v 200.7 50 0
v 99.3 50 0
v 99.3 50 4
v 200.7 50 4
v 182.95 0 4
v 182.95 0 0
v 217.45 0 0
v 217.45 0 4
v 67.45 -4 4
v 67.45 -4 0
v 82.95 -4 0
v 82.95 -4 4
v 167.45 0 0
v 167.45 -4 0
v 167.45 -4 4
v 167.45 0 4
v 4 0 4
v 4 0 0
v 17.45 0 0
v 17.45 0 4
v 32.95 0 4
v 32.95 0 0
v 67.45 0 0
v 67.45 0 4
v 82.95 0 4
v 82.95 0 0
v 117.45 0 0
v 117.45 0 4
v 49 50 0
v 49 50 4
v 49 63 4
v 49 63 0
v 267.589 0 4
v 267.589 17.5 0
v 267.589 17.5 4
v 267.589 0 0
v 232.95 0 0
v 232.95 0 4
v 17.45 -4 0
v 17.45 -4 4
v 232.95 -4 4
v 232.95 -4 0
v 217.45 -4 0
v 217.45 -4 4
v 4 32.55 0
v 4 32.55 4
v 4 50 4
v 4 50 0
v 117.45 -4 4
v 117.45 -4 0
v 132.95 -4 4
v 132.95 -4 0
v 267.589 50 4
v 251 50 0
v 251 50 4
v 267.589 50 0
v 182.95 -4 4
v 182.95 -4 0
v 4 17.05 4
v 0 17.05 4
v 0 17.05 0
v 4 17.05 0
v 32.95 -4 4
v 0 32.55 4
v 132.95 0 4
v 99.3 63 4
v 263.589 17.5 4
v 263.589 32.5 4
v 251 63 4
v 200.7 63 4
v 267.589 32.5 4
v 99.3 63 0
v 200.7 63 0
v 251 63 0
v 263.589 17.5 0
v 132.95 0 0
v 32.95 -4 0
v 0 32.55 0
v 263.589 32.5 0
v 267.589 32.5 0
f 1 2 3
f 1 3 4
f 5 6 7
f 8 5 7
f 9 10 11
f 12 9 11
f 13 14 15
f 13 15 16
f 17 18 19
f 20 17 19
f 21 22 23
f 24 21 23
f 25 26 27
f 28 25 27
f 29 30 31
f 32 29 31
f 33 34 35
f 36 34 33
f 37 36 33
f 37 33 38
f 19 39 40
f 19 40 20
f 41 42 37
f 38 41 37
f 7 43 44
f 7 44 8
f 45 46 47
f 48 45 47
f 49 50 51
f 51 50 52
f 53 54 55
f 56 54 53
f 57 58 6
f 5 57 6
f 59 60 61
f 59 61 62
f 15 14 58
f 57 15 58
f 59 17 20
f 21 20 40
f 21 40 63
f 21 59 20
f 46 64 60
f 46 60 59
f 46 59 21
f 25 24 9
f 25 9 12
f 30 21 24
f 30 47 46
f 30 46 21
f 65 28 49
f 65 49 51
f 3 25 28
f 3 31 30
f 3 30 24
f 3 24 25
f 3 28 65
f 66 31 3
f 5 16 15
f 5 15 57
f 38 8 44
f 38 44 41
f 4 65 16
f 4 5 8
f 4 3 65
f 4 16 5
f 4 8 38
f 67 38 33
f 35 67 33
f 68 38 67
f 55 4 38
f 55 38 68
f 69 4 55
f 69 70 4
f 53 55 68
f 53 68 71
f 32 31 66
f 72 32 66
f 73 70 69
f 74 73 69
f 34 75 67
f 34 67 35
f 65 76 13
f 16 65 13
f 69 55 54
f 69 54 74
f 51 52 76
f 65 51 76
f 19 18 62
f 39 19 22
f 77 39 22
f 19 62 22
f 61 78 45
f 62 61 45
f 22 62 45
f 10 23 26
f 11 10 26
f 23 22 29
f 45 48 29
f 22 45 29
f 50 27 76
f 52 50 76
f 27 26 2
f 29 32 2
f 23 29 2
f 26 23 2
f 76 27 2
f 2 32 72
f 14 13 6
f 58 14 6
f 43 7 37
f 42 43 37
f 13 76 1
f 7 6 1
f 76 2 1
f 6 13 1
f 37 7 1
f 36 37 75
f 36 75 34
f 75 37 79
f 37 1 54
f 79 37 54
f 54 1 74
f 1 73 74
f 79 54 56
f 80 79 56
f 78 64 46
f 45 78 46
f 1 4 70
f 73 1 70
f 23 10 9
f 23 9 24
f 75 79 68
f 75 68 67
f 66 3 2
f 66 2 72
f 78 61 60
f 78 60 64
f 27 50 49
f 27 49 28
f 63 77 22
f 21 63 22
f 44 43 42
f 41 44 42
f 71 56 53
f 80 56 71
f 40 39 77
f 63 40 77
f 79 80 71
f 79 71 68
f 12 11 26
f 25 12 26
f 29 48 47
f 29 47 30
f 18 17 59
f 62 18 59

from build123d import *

# Parameters (mm, degrees)
SKIZZE1_W                       = 300
SKIZZE1_H                       = 50
AUFSATZ_LINEAR_AUSTRAGEN1_DEPTH = 4
SKIZZE2_W                       = 15.5
SKIZZE2_H                       = 4
AUFSATZ_LINEAR_AUSTRAGEN3_DEPTH = 4
SCHNITT_LINEAR_AUSTRAGEN1_REACH = 6
SKIZZE3_W                       = 4
SKIZZE3_H                       = 17.45
SKIZZE3_H_2                     = 17.05
SKIZZE4_W                       = 50.3
SKIZZE4_H                       = 13
AUFSATZ_LINEAR_AUSTRAGEN4_DEPTH = 4
SCHNITT_LINEAR_AUSTRAGEN2_REACH = 6


with BuildPart() as part:
    # Skizze1 → Aufsatz-Linear austragen1 (new body)
    with BuildSketch(Plane.XY):
        with Locations((150, 25)):
            Rectangle(SKIZZE1_W, SKIZZE1_H)
    extrude(amount=AUFSATZ_LINEAR_AUSTRAGEN1_DEPTH)

    # Skizze2 → Aufsatz-Linear austragen3 (add)
    with BuildSketch(Plane.XY):
        with Locations((25.2, -2)):
            Rectangle(SKIZZE2_W, SKIZZE2_H)
        with Locations((75.2, -2)):
            Rectangle(SKIZZE2_W, SKIZZE2_H)
        with Locations((125.2, -2)):
            Rectangle(SKIZZE2_W, SKIZZE2_H)
        with Locations((175.2, -2)):
            Rectangle(SKIZZE2_W, SKIZZE2_H)
        with Locations((225.2, -2)):
            Rectangle(SKIZZE2_W, SKIZZE2_H)
        with Locations((275.2, -2)):
            Rectangle(SKIZZE2_W, SKIZZE2_H)
    extrude(amount=AUFSATZ_LINEAR_AUSTRAGEN3_DEPTH)

    # Skizze3 → Schnitt-Linear austragen1 (cut, up to next)
    with BuildSketch(Plane.XY.offset(4), mode=Mode.PRIVATE) as schnitt_linear_austragen1_sk1:
        with Locations((2, 41.275)):
            Rectangle(SKIZZE3_W, SKIZZE3_H)
    schnitt_linear_austragen1_tool1 = extrude(schnitt_linear_austragen1_sk1.sketch, amount=-SCHNITT_LINEAR_AUSTRAGEN1_REACH, mode=Mode.PRIVATE) & part.part
    add(schnitt_linear_austragen1_tool1.solids().sort_by_distance((2, 41.275, 4))[0], mode=Mode.SUBTRACT)
    # Skizze3 → Schnitt-Linear austragen1 (cut, up to next)
    with BuildSketch(Plane.XY.offset(4), mode=Mode.PRIVATE) as schnitt_linear_austragen1_sk2:
        with Locations((2, 8.525)):
            Rectangle(SKIZZE3_W, SKIZZE3_H_2)
    schnitt_linear_austragen1_tool2 = extrude(schnitt_linear_austragen1_sk2.sketch, amount=-SCHNITT_LINEAR_AUSTRAGEN1_REACH, mode=Mode.PRIVATE) & part.part
    add(schnitt_linear_austragen1_tool2.solids().sort_by_distance((2, 8.525, 4))[0], mode=Mode.SUBTRACT)
    # Skizze3 → Schnitt-Linear austragen1 (cut, up to next)
    with BuildSketch(Plane.XY.offset(4), mode=Mode.PRIVATE) as schnitt_linear_austragen1_sk3:
        with Locations((298, 8.525)):
            Rectangle(SKIZZE3_W, SKIZZE3_H_2)
    schnitt_linear_austragen1_tool3 = extrude(schnitt_linear_austragen1_sk3.sketch, amount=-SCHNITT_LINEAR_AUSTRAGEN1_REACH, mode=Mode.PRIVATE) & part.part
    add(schnitt_linear_austragen1_tool3.solids().sort_by_distance((298, 8.525, 4))[0], mode=Mode.SUBTRACT)
    # Skizze3 → Schnitt-Linear austragen1 (cut, up to next)
    with BuildSketch(Plane.XY.offset(4), mode=Mode.PRIVATE) as schnitt_linear_austragen1_sk4:
        with Locations((298, 41.275)):
            Rectangle(SKIZZE3_W, SKIZZE3_H)
    schnitt_linear_austragen1_tool4 = extrude(schnitt_linear_austragen1_sk4.sketch, amount=-SCHNITT_LINEAR_AUSTRAGEN1_REACH, mode=Mode.PRIVATE) & part.part
    add(schnitt_linear_austragen1_tool4.solids().sort_by_distance((298, 41.275, 4))[0], mode=Mode.SUBTRACT)

    # Skizze4 → Aufsatz-Linear austragen4 (add)
    with BuildSketch(Plane.XY.offset(4)):
        with Locations((74.15, 56.5)):
            Rectangle(SKIZZE4_W, SKIZZE4_H)
        with Locations((225.85, 56.5)):
            Rectangle(SKIZZE4_W, SKIZZE4_H)
    extrude(amount=-AUFSATZ_LINEAR_AUSTRAGEN4_DEPTH)

    # Skizze5 → Schnitt-Linear austragen2 (cut, up to next)
    with BuildSketch(Plane(origin=(0, 0, 0), x_dir=(-1, 0, 0), z_dir=(0, 0, -1)), mode=Mode.PRIVATE) as schnitt_linear_austragen2_sk1:
        Polygon((-267.589208013, 50), (-267.589208013, 32.5), (-263.589208013, 32.5), (-263.589208013, 17.5), (-267.589208013, 17.5), (-267.589208013, 0), (-260.181086132, 0), (-260.181086132, -8.903305995), (-305.118419692, -8.903305995), (-305.118419692, 50), align=None)
    schnitt_linear_austragen2_tool1 = extrude(schnitt_linear_austragen2_sk1.sketch, amount=-SCHNITT_LINEAR_AUSTRAGEN2_REACH, mode=Mode.PRIVATE) & part.part
    add(schnitt_linear_austragen2_tool1.solids().sort_by_distance((285.186351, 19.956954, 0))[0], mode=Mode.SUBTRACT)


solid = part.part
